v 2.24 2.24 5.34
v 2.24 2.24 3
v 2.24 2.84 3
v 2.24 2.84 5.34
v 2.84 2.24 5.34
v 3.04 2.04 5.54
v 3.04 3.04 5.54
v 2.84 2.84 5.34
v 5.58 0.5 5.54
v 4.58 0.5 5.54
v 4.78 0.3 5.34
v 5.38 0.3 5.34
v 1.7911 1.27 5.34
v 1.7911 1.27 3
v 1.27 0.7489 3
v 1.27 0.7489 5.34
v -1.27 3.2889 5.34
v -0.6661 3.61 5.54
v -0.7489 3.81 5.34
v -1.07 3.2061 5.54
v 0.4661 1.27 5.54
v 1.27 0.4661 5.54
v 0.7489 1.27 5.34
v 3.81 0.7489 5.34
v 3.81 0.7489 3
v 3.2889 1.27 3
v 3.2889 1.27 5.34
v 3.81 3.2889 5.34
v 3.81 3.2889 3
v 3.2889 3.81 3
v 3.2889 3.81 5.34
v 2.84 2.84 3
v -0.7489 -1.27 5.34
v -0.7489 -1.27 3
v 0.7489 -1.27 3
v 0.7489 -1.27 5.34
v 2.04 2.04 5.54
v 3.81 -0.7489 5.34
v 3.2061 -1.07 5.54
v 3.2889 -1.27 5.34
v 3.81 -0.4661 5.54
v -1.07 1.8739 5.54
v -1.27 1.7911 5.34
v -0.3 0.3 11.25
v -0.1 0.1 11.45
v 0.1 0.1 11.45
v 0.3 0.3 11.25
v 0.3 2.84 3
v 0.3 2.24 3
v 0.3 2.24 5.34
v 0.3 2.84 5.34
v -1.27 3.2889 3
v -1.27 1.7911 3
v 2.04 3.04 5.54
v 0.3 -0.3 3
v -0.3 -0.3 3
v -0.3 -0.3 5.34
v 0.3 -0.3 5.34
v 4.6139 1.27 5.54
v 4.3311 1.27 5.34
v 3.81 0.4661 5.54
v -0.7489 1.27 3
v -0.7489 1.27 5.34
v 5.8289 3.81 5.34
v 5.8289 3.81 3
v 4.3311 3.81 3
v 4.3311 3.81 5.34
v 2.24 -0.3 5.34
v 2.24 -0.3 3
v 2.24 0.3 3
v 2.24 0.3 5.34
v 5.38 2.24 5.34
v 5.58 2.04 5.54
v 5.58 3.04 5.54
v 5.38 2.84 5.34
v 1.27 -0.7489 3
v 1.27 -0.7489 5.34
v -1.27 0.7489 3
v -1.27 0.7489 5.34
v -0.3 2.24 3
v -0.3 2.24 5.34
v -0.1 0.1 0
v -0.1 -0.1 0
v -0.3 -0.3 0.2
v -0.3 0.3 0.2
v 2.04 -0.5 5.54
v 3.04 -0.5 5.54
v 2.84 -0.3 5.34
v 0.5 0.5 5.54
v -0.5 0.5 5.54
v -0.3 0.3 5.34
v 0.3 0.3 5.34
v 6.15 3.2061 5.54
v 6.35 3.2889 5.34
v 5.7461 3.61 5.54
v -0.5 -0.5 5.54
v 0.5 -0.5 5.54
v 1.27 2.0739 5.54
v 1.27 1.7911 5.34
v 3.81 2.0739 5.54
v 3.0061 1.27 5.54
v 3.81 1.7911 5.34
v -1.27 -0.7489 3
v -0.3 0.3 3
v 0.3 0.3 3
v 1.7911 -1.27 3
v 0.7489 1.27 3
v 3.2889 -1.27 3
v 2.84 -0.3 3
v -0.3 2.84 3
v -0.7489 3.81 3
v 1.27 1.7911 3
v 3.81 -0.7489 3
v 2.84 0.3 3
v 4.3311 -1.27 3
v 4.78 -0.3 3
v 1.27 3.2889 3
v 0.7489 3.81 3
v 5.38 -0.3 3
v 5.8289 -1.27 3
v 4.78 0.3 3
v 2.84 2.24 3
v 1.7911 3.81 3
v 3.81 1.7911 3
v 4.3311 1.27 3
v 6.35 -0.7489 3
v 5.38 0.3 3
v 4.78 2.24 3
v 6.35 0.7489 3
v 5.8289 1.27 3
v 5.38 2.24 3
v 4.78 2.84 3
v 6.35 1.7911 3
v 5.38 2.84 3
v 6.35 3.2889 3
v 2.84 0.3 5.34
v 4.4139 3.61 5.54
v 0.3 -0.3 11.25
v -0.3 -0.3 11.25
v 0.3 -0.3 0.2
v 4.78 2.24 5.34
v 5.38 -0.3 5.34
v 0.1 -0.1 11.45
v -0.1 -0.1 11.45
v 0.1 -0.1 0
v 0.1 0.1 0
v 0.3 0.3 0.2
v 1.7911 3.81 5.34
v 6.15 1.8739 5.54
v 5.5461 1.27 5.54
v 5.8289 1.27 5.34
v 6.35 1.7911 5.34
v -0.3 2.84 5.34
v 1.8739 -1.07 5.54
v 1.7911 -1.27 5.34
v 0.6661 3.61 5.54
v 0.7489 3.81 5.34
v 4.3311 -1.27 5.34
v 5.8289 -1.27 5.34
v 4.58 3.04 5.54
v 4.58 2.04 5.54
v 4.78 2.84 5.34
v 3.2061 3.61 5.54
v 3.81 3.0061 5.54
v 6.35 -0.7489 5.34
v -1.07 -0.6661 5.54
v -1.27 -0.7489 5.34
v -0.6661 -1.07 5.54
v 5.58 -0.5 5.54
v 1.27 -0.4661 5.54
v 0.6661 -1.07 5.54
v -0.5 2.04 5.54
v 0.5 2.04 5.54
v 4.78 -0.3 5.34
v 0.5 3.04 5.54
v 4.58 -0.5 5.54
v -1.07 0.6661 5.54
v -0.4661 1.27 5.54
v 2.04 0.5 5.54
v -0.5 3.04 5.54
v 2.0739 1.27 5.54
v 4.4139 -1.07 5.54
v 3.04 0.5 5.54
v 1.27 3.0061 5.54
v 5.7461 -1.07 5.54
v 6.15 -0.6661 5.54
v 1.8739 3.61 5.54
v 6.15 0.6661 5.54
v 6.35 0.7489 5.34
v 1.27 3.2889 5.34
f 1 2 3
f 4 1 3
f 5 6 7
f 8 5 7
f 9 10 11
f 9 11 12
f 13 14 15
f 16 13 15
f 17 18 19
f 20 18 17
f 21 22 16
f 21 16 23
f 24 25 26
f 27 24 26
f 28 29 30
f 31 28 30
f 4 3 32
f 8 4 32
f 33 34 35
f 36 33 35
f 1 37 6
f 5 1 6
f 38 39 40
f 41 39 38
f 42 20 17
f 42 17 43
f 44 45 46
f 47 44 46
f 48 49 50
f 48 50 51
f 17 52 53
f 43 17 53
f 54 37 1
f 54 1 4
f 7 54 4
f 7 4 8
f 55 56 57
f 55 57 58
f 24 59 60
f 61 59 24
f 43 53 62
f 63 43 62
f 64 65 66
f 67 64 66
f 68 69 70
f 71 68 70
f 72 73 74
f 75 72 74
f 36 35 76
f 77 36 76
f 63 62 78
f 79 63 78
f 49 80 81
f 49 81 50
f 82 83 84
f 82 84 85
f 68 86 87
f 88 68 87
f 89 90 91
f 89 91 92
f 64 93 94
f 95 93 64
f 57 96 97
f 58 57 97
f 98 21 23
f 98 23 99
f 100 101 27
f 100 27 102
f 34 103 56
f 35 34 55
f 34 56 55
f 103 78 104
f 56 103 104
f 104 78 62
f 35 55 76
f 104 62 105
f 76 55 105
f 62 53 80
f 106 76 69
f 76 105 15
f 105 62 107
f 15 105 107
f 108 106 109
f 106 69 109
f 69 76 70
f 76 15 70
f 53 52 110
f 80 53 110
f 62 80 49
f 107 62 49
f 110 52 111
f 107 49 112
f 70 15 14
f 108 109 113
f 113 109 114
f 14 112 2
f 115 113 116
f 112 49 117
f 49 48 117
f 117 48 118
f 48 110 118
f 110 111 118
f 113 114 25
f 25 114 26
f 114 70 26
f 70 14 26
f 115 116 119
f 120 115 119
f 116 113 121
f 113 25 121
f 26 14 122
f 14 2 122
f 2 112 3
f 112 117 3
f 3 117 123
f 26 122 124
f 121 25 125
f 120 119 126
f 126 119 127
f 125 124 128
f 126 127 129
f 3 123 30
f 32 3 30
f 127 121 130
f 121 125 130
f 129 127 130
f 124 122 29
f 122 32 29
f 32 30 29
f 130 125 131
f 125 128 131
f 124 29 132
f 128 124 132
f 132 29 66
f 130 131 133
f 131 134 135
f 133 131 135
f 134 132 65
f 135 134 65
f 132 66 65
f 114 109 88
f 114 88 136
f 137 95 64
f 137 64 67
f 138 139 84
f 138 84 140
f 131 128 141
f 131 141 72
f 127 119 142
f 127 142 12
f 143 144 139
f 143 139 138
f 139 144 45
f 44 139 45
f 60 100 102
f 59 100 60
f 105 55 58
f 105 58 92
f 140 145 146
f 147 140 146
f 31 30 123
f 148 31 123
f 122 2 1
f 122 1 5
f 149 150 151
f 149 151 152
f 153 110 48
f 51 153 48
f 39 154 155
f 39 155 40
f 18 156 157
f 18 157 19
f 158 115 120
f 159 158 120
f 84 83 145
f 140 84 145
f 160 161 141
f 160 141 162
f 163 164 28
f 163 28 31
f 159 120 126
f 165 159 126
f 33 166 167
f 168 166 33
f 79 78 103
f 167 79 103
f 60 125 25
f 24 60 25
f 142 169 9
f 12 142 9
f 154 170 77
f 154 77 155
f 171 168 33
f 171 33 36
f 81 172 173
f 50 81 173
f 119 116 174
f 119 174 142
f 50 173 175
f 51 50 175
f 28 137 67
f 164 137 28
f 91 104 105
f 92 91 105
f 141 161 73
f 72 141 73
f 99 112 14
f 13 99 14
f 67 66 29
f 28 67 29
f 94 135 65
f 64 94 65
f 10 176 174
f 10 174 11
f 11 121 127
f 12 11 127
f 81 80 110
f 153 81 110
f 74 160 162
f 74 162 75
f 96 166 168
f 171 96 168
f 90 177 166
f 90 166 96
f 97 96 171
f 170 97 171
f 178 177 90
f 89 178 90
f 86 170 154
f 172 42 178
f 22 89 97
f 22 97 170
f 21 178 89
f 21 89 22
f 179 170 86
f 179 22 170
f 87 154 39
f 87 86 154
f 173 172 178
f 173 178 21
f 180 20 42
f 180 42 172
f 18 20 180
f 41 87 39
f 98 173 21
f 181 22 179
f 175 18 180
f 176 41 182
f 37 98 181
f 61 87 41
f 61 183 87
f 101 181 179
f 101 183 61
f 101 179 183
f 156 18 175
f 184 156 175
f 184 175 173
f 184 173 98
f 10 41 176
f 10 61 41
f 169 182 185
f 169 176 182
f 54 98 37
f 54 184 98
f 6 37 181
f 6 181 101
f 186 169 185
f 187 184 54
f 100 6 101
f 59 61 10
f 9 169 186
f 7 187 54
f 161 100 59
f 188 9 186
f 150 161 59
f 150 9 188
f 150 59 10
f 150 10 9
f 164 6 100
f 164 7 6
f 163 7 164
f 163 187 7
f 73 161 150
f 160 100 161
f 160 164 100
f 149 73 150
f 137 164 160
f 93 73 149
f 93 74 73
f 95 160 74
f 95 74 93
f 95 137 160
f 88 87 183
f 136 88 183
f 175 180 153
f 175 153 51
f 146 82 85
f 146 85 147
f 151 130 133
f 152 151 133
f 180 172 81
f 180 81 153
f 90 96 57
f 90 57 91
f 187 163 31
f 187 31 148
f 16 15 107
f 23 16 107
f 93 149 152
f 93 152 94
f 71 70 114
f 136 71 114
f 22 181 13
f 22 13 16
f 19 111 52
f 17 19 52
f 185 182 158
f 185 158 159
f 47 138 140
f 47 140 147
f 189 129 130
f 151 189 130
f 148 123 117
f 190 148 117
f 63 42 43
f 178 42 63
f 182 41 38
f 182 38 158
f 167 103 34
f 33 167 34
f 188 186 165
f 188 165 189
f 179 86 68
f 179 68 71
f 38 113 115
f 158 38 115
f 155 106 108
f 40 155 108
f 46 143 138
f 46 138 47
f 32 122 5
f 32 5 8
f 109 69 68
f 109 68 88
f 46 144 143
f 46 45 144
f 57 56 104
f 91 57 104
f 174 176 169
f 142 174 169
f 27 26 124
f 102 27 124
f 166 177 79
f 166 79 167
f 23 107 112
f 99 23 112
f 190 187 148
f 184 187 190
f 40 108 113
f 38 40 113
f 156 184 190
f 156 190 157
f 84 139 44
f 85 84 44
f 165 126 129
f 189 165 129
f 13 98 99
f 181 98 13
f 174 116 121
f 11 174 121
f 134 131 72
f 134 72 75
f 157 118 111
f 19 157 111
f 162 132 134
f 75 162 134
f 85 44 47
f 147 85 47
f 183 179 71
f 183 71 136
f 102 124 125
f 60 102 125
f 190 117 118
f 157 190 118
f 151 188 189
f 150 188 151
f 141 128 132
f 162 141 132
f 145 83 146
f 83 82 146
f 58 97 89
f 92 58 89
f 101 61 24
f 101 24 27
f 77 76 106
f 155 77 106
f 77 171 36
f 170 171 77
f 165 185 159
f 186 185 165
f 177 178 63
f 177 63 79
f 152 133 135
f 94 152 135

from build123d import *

# Parameters (mm, degrees)
F2_W      = 0.6
F2_H      = 0.6
F3_DEPTH  = 2.54
F0_W      = 0.6
F0_H      = 0.6
F4_DEPTH  = 11.45
F5_SIZE   = 0.2
F5_2_SIZE = 0.2
F5_3_SIZE = 0.2
F5_4_SIZE = 0.2
F5_5_SIZE = 0.2
F5_6_SIZE = 0.2
F6_SIZE   = 0.2


with BuildPart() as f3:
    # F2 (on offset) → F3 (new body)
    with BuildSketch(Plane.XY.offset(3)):
        Polygon((1.27, 0.7489051486), (0.7489051486, 1.27), (-0.7489051486, 1.27), (-1.27, 0.7489051486), (-1.27, -0.7489051486), (-0.7489051486, -1.27), (0.7489051486, -1.27), (1.27, -0.7489051486), align=None)
        Rectangle(F2_W, F2_H, mode=Mode.SUBTRACT)
        Polygon((-0.7489051486, 1.27), (0.7489051486, 1.27), (1.27, 1.7910948514), (1.27, 3.2889051486), (0.7489051486, 3.81), (-0.7489051486, 3.81), (-1.27, 3.2889051486), (-1.27, 1.7910948514), align=None)
        with Locations((0, 2.54)):
            Rectangle(F2_W, F2_H, mode=Mode.SUBTRACT)
        Polygon((1.7910948514, 1.27), (1.27, 0.7489051486), (1.27, -0.7489051486), (1.7910948514, -1.27), (3.2889051486, -1.27), (3.81, -0.7489051486), (3.81, 0.7489051486), (3.2889051486, 1.27), align=None)
        with Locations((2.54, 0)):
            Rectangle(F2_W, F2_H, mode=Mode.SUBTRACT)
        Polygon((1.27, 3.2889051486), (1.27, 1.7910948514), (1.7910948514, 1.27), (3.2889051486, 1.27), (3.81, 1.7910948514), (3.81, 3.2889051486), (3.2889051486, 3.81), (1.7910948514, 3.81), align=None)
        with Locations((2.54, 2.54)):
            Rectangle(F2_W, F2_H, mode=Mode.SUBTRACT)
        Polygon((4.3310948514, 1.27), (3.81, 0.7489051486), (3.81, -0.7489051486), (4.3310948514, -1.27), (5.8289051486, -1.27), (6.35, -0.7489051486), (6.35, 0.7489051486), (5.8289051486, 1.27), align=None)
        with Locations((5.08, 0)):
            Rectangle(F2_W, F2_H, mode=Mode.SUBTRACT)
        Polygon((3.81, 3.2889051486), (3.81, 1.7910948514), (4.3310948514, 1.27), (5.8289051486, 1.27), (6.35, 1.7910948514), (6.35, 3.2889051486), (5.8289051486, 3.81), (4.3310948514, 3.81), align=None)
        with Locations((5.08, 2.54)):
            Rectangle(F2_W, F2_H, mode=Mode.SUBTRACT)
    extrude(amount=F3_DEPTH)

    # F6
    f6_edges = [f3.edges().sort_by_distance(p)[0] for p in [
        (1.009453, 1.009453, 5.54),
        (1.009453, 1.530547, 5.54),
        (1.530547, 1.530547, 5.54),
        (1.530547, 1.009453, 5.54),
        (1.009453, 3.549453, 5.54),
        (0, 3.81, 5.54),
        (-1.009453, 3.549453, 5.54),
        (-1.27, 2.54, 5.54),
        (-1.009453, 1.530547, 5.54),
        (-1.009453, 1.009453, 5.54),
        (-1.27, 0, 5.54),
        (-1.009453, -1.009453, 5.54),
        (0, -1.27, 5.54),
        (1.009453, -1.009453, 5.54),
        (1.530547, -1.009453, 5.54),
        (2.54, -1.27, 5.54),
        (3.549453, -1.009453, 5.54),
        (4.070547, -1.009453, 5.54),
        (5.08, -1.27, 5.54),
        (6.089453, -1.009453, 5.54),
        (6.35, 0, 5.54),
        (6.089453, 1.009453, 5.54),
        (6.089453, 1.530547, 5.54),
        (6.35, 2.54, 5.54),
        (6.089453, 3.549453, 5.54),
        (5.08, 3.81, 5.54),
        (4.070547, 3.549453, 5.54),
        (3.549453, 3.549453, 5.54),
        (2.54, 3.81, 5.54),
        (1.530547, 3.549453, 5.54),
        (4.070547, 1.009453, 5.54),
        (3.549453, 1.009453, 5.54),
        (3.549453, 1.530547, 5.54),
        (4.070547, 1.530547, 5.54),
        (0.3, 0, 5.54),
        (0, -0.3, 5.54),
        (-0.3, 0, 5.54),
        (0, 0.3, 5.54),
        (-0.3, 2.54, 5.54),
        (0, 2.84, 5.54),
        (0.3, 2.54, 5.54),
        (0, 2.24, 5.54),
        (2.24, 0, 5.54),
        (2.54, 0.3, 5.54),
        (2.84, 0, 5.54),
        (2.54, -0.3, 5.54),
        (2.24, 2.54, 5.54),
        (2.54, 2.84, 5.54),
        (2.84, 2.54, 5.54),
        (2.54, 2.24, 5.54),
        (4.78, 0, 5.54),
        (5.08, 0.3, 5.54),
        (5.38, 0, 5.54),
        (5.08, -0.3, 5.54),
        (5.08, 2.24, 5.54),
        (4.78, 2.54, 5.54),
        (5.08, 2.84, 5.54),
        (5.38, 2.54, 5.54),
    ]]
    chamfer(f6_edges, length=F6_SIZE)


with BuildPart() as f4:
    # F0 (on Top) → F4 (new body)
    with BuildSketch(Plane.XY):
        Rectangle(F0_W, F0_H)
    extrude(amount=F4_DEPTH)

    # F5#2
    f5_2_edges = [f4.edges().sort_by_distance(p)[0] for p in [
        (0, -0.3, 11.45),
        (0.3, 0, 11.45),
        (0, 0.3, 11.45),
        (-0.3, 0, 11.45),
        (0, -0.3, 0),
        (0.3, 0, 0),
        (0, 0.3, 0),
        (-0.3, 0, 0),
    ]]
    chamfer(f5_2_edges, length=F5_2_SIZE)


with BuildPart() as f4b:
    # F0 (on Top) → F4, piece 2 (new body)
    with BuildSketch(Plane.XY):
        with Locations((0, 2.54)):
            Rectangle(F0_W, F0_H)
    extrude(amount=F4_DEPTH)

    # F5
    f5_edges = [f4b.edges().sort_by_distance(p)[0] for p in [
        (0.3, 2.54, 11.45),
        (0, 2.84, 11.45),
        (-0.3, 2.54, 11.45),
        (0, 2.24, 11.45),
        (0.3, 2.54, 0),
        (0, 2.84, 0),
        (-0.3, 2.54, 0),
        (0, 2.24, 0),
    ]]
    chamfer(f5_edges, length=F5_SIZE)


with BuildPart() as f4c:
    # F0 (on Top) → F4, piece 3 (new body)
    with BuildSketch(Plane.XY):
        with Locations((2.54, 0)):
            Rectangle(F0_W, F0_H)
    extrude(amount=F4_DEPTH)

    # F5#4
    f5_4_edges = [f4c.edges().sort_by_distance(p)[0] for p in [
        (2.84, 0, 11.45),
        (2.54, 0.3, 11.45),
        (2.24, 0, 11.45),
        (2.54, -0.3, 11.45),
        (2.84, 0, 0),
        (2.54, 0.3, 0),
        (2.24, 0, 0),
        (2.54, -0.3, 0),
    ]]
    chamfer(f5_4_edges, length=F5_4_SIZE)


with BuildPart() as f4d:
    # F0 (on Top) → F4, piece 4 (new body)
    with BuildSketch(Plane.XY):
        with Locations((2.54, 2.54)):
            Rectangle(F0_W, F0_H)
    extrude(amount=F4_DEPTH)

    # F5#3
    f5_3_edges = [f4d.edges().sort_by_distance(p)[0] for p in [
        (2.84, 2.54, 11.45),
        (2.54, 2.84, 11.45),
        (2.24, 2.54, 11.45),
        (2.54, 2.24, 11.45),
        (2.84, 2.54, 0),
        (2.54, 2.84, 0),
        (2.24, 2.54, 0),
        (2.54, 2.24, 0),
    ]]
    chamfer(f5_3_edges, length=F5_3_SIZE)


with BuildPart() as f4e:
    # F0 (on Top) → F4, piece 5 (new body)
    with BuildSketch(Plane.XY):
        with Locations((5.08, 0)):
            Rectangle(F0_W, F0_H)
    extrude(amount=F4_DEPTH)

    # F5#5
    f5_5_edges = [f4e.edges().sort_by_distance(p)[0] for p in [
        (5.38, 0, 11.45),
        (5.08, 0.3, 11.45),
        (4.78, 0, 11.45),
        (5.08, -0.3, 11.45),
        (5.38, 0, 0),
        (5.08, 0.3, 0),
        (4.78, 0, 0),
        (5.08, -0.3, 0),
    ]]
    chamfer(f5_5_edges, length=F5_5_SIZE)


with BuildPart() as f4f:
    # F0 (on Top) → F4, piece 6 (new body)
    with BuildSketch(Plane.XY):
        with Locations((5.08, 2.54)):
            Rectangle(F0_W, F0_H)
    extrude(amount=F4_DEPTH)

    # F5#6
    f5_6_edges = [f4f.edges().sort_by_distance(p)[0] for p in [
        (5.38, 2.54, 11.45),
        (5.08, 2.84, 11.45),
        (4.78, 2.54, 11.45),
        (5.08, 2.24, 11.45),
        (5.38, 2.54, 0),
        (5.08, 2.84, 0),
        (4.78, 2.54, 0),
        (5.08, 2.24, 0),
    ]]
    chamfer(f5_6_edges, length=F5_6_SIZE)


solid = Compound([f3.part, f4.part])
